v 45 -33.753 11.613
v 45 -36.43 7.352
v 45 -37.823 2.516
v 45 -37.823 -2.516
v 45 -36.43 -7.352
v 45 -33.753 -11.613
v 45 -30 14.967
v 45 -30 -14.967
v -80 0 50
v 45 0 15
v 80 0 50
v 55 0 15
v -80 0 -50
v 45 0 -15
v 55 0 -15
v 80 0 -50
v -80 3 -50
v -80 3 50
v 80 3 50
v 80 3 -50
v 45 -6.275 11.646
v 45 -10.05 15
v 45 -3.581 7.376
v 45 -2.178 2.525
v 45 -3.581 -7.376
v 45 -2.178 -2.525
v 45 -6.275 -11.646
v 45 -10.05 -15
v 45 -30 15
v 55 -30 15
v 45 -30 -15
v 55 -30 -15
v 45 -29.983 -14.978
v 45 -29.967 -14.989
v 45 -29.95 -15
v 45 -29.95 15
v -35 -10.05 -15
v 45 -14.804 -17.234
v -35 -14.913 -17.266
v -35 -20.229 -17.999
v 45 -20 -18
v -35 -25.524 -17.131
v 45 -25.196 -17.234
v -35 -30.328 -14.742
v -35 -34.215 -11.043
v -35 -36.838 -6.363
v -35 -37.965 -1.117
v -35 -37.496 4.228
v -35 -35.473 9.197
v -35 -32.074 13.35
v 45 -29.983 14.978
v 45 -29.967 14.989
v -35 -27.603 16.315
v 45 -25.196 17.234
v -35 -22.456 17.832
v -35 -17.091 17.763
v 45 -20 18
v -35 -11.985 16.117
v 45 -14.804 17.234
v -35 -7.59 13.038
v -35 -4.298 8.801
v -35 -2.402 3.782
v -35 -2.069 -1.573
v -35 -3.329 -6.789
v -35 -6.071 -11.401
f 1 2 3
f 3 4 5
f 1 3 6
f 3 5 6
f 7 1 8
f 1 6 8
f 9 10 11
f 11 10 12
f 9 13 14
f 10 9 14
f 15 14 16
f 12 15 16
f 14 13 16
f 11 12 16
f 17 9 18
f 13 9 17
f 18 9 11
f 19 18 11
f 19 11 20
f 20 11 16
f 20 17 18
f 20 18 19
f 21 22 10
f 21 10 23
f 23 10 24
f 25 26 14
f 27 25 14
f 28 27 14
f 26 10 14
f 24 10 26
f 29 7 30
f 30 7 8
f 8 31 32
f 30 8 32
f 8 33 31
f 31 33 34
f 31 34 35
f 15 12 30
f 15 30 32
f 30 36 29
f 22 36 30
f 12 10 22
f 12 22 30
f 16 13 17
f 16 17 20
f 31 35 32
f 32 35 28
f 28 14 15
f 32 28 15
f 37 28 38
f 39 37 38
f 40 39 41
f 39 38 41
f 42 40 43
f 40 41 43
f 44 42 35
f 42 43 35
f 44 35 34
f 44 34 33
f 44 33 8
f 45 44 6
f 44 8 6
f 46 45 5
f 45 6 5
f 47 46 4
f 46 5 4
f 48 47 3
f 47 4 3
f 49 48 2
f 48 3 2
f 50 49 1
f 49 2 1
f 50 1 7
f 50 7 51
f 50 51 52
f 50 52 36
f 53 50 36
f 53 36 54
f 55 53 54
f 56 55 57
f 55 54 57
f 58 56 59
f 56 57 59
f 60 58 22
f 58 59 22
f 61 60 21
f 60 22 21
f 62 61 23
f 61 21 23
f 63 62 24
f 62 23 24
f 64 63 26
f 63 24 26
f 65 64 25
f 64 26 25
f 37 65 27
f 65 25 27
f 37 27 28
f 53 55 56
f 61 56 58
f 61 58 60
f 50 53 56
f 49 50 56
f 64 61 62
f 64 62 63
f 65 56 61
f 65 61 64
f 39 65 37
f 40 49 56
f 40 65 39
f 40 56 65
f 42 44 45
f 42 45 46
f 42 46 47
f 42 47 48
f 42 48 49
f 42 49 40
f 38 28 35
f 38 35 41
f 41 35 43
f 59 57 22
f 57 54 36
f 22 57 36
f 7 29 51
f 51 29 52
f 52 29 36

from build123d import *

# Parameters (mm, degrees)
SKETCH1_W           = 160
SKETCH1_H           = 100
BOSS_EXTRUDE1_DEPTH = 3
SKETCH2_W           = 10
SKETCH2_H           = 30
BOSS_EXTRUDE2_DEPTH = 30
SKETCH3_R           = 18
BOSS_EXTRUDE3_DEPTH = 80


with BuildPart() as part:
    # Sketch1 → Boss-Extrude1 (new body)
    with BuildSketch(Plane(origin=(0, 0, 0), x_dir=(1, 0, 0), z_dir=(0, 1, 0))):
        Rectangle(SKETCH1_W, SKETCH1_H)
    extrude(amount=BOSS_EXTRUDE1_DEPTH)

    # Sketch2 → Boss-Extrude2 (add)
    with BuildSketch(Plane(origin=(0, 0, 0), x_dir=(1, 0, 0), z_dir=(0, 1, 0))):
        with Locations((50, 0)):
            Rectangle(SKETCH2_W, SKETCH2_H)
    extrude(amount=-BOSS_EXTRUDE2_DEPTH)

    # Sketch3 → Boss-Extrude3 (add)
    with BuildSketch(Plane.ZY.offset(-45)):
        with Locations(Location((0, -20, 0), (0, 0, 146.442690238))):
            Circle(SKETCH3_R)
    extrude(amount=BOSS_EXTRUDE3_DEPTH)


solid = part.part
